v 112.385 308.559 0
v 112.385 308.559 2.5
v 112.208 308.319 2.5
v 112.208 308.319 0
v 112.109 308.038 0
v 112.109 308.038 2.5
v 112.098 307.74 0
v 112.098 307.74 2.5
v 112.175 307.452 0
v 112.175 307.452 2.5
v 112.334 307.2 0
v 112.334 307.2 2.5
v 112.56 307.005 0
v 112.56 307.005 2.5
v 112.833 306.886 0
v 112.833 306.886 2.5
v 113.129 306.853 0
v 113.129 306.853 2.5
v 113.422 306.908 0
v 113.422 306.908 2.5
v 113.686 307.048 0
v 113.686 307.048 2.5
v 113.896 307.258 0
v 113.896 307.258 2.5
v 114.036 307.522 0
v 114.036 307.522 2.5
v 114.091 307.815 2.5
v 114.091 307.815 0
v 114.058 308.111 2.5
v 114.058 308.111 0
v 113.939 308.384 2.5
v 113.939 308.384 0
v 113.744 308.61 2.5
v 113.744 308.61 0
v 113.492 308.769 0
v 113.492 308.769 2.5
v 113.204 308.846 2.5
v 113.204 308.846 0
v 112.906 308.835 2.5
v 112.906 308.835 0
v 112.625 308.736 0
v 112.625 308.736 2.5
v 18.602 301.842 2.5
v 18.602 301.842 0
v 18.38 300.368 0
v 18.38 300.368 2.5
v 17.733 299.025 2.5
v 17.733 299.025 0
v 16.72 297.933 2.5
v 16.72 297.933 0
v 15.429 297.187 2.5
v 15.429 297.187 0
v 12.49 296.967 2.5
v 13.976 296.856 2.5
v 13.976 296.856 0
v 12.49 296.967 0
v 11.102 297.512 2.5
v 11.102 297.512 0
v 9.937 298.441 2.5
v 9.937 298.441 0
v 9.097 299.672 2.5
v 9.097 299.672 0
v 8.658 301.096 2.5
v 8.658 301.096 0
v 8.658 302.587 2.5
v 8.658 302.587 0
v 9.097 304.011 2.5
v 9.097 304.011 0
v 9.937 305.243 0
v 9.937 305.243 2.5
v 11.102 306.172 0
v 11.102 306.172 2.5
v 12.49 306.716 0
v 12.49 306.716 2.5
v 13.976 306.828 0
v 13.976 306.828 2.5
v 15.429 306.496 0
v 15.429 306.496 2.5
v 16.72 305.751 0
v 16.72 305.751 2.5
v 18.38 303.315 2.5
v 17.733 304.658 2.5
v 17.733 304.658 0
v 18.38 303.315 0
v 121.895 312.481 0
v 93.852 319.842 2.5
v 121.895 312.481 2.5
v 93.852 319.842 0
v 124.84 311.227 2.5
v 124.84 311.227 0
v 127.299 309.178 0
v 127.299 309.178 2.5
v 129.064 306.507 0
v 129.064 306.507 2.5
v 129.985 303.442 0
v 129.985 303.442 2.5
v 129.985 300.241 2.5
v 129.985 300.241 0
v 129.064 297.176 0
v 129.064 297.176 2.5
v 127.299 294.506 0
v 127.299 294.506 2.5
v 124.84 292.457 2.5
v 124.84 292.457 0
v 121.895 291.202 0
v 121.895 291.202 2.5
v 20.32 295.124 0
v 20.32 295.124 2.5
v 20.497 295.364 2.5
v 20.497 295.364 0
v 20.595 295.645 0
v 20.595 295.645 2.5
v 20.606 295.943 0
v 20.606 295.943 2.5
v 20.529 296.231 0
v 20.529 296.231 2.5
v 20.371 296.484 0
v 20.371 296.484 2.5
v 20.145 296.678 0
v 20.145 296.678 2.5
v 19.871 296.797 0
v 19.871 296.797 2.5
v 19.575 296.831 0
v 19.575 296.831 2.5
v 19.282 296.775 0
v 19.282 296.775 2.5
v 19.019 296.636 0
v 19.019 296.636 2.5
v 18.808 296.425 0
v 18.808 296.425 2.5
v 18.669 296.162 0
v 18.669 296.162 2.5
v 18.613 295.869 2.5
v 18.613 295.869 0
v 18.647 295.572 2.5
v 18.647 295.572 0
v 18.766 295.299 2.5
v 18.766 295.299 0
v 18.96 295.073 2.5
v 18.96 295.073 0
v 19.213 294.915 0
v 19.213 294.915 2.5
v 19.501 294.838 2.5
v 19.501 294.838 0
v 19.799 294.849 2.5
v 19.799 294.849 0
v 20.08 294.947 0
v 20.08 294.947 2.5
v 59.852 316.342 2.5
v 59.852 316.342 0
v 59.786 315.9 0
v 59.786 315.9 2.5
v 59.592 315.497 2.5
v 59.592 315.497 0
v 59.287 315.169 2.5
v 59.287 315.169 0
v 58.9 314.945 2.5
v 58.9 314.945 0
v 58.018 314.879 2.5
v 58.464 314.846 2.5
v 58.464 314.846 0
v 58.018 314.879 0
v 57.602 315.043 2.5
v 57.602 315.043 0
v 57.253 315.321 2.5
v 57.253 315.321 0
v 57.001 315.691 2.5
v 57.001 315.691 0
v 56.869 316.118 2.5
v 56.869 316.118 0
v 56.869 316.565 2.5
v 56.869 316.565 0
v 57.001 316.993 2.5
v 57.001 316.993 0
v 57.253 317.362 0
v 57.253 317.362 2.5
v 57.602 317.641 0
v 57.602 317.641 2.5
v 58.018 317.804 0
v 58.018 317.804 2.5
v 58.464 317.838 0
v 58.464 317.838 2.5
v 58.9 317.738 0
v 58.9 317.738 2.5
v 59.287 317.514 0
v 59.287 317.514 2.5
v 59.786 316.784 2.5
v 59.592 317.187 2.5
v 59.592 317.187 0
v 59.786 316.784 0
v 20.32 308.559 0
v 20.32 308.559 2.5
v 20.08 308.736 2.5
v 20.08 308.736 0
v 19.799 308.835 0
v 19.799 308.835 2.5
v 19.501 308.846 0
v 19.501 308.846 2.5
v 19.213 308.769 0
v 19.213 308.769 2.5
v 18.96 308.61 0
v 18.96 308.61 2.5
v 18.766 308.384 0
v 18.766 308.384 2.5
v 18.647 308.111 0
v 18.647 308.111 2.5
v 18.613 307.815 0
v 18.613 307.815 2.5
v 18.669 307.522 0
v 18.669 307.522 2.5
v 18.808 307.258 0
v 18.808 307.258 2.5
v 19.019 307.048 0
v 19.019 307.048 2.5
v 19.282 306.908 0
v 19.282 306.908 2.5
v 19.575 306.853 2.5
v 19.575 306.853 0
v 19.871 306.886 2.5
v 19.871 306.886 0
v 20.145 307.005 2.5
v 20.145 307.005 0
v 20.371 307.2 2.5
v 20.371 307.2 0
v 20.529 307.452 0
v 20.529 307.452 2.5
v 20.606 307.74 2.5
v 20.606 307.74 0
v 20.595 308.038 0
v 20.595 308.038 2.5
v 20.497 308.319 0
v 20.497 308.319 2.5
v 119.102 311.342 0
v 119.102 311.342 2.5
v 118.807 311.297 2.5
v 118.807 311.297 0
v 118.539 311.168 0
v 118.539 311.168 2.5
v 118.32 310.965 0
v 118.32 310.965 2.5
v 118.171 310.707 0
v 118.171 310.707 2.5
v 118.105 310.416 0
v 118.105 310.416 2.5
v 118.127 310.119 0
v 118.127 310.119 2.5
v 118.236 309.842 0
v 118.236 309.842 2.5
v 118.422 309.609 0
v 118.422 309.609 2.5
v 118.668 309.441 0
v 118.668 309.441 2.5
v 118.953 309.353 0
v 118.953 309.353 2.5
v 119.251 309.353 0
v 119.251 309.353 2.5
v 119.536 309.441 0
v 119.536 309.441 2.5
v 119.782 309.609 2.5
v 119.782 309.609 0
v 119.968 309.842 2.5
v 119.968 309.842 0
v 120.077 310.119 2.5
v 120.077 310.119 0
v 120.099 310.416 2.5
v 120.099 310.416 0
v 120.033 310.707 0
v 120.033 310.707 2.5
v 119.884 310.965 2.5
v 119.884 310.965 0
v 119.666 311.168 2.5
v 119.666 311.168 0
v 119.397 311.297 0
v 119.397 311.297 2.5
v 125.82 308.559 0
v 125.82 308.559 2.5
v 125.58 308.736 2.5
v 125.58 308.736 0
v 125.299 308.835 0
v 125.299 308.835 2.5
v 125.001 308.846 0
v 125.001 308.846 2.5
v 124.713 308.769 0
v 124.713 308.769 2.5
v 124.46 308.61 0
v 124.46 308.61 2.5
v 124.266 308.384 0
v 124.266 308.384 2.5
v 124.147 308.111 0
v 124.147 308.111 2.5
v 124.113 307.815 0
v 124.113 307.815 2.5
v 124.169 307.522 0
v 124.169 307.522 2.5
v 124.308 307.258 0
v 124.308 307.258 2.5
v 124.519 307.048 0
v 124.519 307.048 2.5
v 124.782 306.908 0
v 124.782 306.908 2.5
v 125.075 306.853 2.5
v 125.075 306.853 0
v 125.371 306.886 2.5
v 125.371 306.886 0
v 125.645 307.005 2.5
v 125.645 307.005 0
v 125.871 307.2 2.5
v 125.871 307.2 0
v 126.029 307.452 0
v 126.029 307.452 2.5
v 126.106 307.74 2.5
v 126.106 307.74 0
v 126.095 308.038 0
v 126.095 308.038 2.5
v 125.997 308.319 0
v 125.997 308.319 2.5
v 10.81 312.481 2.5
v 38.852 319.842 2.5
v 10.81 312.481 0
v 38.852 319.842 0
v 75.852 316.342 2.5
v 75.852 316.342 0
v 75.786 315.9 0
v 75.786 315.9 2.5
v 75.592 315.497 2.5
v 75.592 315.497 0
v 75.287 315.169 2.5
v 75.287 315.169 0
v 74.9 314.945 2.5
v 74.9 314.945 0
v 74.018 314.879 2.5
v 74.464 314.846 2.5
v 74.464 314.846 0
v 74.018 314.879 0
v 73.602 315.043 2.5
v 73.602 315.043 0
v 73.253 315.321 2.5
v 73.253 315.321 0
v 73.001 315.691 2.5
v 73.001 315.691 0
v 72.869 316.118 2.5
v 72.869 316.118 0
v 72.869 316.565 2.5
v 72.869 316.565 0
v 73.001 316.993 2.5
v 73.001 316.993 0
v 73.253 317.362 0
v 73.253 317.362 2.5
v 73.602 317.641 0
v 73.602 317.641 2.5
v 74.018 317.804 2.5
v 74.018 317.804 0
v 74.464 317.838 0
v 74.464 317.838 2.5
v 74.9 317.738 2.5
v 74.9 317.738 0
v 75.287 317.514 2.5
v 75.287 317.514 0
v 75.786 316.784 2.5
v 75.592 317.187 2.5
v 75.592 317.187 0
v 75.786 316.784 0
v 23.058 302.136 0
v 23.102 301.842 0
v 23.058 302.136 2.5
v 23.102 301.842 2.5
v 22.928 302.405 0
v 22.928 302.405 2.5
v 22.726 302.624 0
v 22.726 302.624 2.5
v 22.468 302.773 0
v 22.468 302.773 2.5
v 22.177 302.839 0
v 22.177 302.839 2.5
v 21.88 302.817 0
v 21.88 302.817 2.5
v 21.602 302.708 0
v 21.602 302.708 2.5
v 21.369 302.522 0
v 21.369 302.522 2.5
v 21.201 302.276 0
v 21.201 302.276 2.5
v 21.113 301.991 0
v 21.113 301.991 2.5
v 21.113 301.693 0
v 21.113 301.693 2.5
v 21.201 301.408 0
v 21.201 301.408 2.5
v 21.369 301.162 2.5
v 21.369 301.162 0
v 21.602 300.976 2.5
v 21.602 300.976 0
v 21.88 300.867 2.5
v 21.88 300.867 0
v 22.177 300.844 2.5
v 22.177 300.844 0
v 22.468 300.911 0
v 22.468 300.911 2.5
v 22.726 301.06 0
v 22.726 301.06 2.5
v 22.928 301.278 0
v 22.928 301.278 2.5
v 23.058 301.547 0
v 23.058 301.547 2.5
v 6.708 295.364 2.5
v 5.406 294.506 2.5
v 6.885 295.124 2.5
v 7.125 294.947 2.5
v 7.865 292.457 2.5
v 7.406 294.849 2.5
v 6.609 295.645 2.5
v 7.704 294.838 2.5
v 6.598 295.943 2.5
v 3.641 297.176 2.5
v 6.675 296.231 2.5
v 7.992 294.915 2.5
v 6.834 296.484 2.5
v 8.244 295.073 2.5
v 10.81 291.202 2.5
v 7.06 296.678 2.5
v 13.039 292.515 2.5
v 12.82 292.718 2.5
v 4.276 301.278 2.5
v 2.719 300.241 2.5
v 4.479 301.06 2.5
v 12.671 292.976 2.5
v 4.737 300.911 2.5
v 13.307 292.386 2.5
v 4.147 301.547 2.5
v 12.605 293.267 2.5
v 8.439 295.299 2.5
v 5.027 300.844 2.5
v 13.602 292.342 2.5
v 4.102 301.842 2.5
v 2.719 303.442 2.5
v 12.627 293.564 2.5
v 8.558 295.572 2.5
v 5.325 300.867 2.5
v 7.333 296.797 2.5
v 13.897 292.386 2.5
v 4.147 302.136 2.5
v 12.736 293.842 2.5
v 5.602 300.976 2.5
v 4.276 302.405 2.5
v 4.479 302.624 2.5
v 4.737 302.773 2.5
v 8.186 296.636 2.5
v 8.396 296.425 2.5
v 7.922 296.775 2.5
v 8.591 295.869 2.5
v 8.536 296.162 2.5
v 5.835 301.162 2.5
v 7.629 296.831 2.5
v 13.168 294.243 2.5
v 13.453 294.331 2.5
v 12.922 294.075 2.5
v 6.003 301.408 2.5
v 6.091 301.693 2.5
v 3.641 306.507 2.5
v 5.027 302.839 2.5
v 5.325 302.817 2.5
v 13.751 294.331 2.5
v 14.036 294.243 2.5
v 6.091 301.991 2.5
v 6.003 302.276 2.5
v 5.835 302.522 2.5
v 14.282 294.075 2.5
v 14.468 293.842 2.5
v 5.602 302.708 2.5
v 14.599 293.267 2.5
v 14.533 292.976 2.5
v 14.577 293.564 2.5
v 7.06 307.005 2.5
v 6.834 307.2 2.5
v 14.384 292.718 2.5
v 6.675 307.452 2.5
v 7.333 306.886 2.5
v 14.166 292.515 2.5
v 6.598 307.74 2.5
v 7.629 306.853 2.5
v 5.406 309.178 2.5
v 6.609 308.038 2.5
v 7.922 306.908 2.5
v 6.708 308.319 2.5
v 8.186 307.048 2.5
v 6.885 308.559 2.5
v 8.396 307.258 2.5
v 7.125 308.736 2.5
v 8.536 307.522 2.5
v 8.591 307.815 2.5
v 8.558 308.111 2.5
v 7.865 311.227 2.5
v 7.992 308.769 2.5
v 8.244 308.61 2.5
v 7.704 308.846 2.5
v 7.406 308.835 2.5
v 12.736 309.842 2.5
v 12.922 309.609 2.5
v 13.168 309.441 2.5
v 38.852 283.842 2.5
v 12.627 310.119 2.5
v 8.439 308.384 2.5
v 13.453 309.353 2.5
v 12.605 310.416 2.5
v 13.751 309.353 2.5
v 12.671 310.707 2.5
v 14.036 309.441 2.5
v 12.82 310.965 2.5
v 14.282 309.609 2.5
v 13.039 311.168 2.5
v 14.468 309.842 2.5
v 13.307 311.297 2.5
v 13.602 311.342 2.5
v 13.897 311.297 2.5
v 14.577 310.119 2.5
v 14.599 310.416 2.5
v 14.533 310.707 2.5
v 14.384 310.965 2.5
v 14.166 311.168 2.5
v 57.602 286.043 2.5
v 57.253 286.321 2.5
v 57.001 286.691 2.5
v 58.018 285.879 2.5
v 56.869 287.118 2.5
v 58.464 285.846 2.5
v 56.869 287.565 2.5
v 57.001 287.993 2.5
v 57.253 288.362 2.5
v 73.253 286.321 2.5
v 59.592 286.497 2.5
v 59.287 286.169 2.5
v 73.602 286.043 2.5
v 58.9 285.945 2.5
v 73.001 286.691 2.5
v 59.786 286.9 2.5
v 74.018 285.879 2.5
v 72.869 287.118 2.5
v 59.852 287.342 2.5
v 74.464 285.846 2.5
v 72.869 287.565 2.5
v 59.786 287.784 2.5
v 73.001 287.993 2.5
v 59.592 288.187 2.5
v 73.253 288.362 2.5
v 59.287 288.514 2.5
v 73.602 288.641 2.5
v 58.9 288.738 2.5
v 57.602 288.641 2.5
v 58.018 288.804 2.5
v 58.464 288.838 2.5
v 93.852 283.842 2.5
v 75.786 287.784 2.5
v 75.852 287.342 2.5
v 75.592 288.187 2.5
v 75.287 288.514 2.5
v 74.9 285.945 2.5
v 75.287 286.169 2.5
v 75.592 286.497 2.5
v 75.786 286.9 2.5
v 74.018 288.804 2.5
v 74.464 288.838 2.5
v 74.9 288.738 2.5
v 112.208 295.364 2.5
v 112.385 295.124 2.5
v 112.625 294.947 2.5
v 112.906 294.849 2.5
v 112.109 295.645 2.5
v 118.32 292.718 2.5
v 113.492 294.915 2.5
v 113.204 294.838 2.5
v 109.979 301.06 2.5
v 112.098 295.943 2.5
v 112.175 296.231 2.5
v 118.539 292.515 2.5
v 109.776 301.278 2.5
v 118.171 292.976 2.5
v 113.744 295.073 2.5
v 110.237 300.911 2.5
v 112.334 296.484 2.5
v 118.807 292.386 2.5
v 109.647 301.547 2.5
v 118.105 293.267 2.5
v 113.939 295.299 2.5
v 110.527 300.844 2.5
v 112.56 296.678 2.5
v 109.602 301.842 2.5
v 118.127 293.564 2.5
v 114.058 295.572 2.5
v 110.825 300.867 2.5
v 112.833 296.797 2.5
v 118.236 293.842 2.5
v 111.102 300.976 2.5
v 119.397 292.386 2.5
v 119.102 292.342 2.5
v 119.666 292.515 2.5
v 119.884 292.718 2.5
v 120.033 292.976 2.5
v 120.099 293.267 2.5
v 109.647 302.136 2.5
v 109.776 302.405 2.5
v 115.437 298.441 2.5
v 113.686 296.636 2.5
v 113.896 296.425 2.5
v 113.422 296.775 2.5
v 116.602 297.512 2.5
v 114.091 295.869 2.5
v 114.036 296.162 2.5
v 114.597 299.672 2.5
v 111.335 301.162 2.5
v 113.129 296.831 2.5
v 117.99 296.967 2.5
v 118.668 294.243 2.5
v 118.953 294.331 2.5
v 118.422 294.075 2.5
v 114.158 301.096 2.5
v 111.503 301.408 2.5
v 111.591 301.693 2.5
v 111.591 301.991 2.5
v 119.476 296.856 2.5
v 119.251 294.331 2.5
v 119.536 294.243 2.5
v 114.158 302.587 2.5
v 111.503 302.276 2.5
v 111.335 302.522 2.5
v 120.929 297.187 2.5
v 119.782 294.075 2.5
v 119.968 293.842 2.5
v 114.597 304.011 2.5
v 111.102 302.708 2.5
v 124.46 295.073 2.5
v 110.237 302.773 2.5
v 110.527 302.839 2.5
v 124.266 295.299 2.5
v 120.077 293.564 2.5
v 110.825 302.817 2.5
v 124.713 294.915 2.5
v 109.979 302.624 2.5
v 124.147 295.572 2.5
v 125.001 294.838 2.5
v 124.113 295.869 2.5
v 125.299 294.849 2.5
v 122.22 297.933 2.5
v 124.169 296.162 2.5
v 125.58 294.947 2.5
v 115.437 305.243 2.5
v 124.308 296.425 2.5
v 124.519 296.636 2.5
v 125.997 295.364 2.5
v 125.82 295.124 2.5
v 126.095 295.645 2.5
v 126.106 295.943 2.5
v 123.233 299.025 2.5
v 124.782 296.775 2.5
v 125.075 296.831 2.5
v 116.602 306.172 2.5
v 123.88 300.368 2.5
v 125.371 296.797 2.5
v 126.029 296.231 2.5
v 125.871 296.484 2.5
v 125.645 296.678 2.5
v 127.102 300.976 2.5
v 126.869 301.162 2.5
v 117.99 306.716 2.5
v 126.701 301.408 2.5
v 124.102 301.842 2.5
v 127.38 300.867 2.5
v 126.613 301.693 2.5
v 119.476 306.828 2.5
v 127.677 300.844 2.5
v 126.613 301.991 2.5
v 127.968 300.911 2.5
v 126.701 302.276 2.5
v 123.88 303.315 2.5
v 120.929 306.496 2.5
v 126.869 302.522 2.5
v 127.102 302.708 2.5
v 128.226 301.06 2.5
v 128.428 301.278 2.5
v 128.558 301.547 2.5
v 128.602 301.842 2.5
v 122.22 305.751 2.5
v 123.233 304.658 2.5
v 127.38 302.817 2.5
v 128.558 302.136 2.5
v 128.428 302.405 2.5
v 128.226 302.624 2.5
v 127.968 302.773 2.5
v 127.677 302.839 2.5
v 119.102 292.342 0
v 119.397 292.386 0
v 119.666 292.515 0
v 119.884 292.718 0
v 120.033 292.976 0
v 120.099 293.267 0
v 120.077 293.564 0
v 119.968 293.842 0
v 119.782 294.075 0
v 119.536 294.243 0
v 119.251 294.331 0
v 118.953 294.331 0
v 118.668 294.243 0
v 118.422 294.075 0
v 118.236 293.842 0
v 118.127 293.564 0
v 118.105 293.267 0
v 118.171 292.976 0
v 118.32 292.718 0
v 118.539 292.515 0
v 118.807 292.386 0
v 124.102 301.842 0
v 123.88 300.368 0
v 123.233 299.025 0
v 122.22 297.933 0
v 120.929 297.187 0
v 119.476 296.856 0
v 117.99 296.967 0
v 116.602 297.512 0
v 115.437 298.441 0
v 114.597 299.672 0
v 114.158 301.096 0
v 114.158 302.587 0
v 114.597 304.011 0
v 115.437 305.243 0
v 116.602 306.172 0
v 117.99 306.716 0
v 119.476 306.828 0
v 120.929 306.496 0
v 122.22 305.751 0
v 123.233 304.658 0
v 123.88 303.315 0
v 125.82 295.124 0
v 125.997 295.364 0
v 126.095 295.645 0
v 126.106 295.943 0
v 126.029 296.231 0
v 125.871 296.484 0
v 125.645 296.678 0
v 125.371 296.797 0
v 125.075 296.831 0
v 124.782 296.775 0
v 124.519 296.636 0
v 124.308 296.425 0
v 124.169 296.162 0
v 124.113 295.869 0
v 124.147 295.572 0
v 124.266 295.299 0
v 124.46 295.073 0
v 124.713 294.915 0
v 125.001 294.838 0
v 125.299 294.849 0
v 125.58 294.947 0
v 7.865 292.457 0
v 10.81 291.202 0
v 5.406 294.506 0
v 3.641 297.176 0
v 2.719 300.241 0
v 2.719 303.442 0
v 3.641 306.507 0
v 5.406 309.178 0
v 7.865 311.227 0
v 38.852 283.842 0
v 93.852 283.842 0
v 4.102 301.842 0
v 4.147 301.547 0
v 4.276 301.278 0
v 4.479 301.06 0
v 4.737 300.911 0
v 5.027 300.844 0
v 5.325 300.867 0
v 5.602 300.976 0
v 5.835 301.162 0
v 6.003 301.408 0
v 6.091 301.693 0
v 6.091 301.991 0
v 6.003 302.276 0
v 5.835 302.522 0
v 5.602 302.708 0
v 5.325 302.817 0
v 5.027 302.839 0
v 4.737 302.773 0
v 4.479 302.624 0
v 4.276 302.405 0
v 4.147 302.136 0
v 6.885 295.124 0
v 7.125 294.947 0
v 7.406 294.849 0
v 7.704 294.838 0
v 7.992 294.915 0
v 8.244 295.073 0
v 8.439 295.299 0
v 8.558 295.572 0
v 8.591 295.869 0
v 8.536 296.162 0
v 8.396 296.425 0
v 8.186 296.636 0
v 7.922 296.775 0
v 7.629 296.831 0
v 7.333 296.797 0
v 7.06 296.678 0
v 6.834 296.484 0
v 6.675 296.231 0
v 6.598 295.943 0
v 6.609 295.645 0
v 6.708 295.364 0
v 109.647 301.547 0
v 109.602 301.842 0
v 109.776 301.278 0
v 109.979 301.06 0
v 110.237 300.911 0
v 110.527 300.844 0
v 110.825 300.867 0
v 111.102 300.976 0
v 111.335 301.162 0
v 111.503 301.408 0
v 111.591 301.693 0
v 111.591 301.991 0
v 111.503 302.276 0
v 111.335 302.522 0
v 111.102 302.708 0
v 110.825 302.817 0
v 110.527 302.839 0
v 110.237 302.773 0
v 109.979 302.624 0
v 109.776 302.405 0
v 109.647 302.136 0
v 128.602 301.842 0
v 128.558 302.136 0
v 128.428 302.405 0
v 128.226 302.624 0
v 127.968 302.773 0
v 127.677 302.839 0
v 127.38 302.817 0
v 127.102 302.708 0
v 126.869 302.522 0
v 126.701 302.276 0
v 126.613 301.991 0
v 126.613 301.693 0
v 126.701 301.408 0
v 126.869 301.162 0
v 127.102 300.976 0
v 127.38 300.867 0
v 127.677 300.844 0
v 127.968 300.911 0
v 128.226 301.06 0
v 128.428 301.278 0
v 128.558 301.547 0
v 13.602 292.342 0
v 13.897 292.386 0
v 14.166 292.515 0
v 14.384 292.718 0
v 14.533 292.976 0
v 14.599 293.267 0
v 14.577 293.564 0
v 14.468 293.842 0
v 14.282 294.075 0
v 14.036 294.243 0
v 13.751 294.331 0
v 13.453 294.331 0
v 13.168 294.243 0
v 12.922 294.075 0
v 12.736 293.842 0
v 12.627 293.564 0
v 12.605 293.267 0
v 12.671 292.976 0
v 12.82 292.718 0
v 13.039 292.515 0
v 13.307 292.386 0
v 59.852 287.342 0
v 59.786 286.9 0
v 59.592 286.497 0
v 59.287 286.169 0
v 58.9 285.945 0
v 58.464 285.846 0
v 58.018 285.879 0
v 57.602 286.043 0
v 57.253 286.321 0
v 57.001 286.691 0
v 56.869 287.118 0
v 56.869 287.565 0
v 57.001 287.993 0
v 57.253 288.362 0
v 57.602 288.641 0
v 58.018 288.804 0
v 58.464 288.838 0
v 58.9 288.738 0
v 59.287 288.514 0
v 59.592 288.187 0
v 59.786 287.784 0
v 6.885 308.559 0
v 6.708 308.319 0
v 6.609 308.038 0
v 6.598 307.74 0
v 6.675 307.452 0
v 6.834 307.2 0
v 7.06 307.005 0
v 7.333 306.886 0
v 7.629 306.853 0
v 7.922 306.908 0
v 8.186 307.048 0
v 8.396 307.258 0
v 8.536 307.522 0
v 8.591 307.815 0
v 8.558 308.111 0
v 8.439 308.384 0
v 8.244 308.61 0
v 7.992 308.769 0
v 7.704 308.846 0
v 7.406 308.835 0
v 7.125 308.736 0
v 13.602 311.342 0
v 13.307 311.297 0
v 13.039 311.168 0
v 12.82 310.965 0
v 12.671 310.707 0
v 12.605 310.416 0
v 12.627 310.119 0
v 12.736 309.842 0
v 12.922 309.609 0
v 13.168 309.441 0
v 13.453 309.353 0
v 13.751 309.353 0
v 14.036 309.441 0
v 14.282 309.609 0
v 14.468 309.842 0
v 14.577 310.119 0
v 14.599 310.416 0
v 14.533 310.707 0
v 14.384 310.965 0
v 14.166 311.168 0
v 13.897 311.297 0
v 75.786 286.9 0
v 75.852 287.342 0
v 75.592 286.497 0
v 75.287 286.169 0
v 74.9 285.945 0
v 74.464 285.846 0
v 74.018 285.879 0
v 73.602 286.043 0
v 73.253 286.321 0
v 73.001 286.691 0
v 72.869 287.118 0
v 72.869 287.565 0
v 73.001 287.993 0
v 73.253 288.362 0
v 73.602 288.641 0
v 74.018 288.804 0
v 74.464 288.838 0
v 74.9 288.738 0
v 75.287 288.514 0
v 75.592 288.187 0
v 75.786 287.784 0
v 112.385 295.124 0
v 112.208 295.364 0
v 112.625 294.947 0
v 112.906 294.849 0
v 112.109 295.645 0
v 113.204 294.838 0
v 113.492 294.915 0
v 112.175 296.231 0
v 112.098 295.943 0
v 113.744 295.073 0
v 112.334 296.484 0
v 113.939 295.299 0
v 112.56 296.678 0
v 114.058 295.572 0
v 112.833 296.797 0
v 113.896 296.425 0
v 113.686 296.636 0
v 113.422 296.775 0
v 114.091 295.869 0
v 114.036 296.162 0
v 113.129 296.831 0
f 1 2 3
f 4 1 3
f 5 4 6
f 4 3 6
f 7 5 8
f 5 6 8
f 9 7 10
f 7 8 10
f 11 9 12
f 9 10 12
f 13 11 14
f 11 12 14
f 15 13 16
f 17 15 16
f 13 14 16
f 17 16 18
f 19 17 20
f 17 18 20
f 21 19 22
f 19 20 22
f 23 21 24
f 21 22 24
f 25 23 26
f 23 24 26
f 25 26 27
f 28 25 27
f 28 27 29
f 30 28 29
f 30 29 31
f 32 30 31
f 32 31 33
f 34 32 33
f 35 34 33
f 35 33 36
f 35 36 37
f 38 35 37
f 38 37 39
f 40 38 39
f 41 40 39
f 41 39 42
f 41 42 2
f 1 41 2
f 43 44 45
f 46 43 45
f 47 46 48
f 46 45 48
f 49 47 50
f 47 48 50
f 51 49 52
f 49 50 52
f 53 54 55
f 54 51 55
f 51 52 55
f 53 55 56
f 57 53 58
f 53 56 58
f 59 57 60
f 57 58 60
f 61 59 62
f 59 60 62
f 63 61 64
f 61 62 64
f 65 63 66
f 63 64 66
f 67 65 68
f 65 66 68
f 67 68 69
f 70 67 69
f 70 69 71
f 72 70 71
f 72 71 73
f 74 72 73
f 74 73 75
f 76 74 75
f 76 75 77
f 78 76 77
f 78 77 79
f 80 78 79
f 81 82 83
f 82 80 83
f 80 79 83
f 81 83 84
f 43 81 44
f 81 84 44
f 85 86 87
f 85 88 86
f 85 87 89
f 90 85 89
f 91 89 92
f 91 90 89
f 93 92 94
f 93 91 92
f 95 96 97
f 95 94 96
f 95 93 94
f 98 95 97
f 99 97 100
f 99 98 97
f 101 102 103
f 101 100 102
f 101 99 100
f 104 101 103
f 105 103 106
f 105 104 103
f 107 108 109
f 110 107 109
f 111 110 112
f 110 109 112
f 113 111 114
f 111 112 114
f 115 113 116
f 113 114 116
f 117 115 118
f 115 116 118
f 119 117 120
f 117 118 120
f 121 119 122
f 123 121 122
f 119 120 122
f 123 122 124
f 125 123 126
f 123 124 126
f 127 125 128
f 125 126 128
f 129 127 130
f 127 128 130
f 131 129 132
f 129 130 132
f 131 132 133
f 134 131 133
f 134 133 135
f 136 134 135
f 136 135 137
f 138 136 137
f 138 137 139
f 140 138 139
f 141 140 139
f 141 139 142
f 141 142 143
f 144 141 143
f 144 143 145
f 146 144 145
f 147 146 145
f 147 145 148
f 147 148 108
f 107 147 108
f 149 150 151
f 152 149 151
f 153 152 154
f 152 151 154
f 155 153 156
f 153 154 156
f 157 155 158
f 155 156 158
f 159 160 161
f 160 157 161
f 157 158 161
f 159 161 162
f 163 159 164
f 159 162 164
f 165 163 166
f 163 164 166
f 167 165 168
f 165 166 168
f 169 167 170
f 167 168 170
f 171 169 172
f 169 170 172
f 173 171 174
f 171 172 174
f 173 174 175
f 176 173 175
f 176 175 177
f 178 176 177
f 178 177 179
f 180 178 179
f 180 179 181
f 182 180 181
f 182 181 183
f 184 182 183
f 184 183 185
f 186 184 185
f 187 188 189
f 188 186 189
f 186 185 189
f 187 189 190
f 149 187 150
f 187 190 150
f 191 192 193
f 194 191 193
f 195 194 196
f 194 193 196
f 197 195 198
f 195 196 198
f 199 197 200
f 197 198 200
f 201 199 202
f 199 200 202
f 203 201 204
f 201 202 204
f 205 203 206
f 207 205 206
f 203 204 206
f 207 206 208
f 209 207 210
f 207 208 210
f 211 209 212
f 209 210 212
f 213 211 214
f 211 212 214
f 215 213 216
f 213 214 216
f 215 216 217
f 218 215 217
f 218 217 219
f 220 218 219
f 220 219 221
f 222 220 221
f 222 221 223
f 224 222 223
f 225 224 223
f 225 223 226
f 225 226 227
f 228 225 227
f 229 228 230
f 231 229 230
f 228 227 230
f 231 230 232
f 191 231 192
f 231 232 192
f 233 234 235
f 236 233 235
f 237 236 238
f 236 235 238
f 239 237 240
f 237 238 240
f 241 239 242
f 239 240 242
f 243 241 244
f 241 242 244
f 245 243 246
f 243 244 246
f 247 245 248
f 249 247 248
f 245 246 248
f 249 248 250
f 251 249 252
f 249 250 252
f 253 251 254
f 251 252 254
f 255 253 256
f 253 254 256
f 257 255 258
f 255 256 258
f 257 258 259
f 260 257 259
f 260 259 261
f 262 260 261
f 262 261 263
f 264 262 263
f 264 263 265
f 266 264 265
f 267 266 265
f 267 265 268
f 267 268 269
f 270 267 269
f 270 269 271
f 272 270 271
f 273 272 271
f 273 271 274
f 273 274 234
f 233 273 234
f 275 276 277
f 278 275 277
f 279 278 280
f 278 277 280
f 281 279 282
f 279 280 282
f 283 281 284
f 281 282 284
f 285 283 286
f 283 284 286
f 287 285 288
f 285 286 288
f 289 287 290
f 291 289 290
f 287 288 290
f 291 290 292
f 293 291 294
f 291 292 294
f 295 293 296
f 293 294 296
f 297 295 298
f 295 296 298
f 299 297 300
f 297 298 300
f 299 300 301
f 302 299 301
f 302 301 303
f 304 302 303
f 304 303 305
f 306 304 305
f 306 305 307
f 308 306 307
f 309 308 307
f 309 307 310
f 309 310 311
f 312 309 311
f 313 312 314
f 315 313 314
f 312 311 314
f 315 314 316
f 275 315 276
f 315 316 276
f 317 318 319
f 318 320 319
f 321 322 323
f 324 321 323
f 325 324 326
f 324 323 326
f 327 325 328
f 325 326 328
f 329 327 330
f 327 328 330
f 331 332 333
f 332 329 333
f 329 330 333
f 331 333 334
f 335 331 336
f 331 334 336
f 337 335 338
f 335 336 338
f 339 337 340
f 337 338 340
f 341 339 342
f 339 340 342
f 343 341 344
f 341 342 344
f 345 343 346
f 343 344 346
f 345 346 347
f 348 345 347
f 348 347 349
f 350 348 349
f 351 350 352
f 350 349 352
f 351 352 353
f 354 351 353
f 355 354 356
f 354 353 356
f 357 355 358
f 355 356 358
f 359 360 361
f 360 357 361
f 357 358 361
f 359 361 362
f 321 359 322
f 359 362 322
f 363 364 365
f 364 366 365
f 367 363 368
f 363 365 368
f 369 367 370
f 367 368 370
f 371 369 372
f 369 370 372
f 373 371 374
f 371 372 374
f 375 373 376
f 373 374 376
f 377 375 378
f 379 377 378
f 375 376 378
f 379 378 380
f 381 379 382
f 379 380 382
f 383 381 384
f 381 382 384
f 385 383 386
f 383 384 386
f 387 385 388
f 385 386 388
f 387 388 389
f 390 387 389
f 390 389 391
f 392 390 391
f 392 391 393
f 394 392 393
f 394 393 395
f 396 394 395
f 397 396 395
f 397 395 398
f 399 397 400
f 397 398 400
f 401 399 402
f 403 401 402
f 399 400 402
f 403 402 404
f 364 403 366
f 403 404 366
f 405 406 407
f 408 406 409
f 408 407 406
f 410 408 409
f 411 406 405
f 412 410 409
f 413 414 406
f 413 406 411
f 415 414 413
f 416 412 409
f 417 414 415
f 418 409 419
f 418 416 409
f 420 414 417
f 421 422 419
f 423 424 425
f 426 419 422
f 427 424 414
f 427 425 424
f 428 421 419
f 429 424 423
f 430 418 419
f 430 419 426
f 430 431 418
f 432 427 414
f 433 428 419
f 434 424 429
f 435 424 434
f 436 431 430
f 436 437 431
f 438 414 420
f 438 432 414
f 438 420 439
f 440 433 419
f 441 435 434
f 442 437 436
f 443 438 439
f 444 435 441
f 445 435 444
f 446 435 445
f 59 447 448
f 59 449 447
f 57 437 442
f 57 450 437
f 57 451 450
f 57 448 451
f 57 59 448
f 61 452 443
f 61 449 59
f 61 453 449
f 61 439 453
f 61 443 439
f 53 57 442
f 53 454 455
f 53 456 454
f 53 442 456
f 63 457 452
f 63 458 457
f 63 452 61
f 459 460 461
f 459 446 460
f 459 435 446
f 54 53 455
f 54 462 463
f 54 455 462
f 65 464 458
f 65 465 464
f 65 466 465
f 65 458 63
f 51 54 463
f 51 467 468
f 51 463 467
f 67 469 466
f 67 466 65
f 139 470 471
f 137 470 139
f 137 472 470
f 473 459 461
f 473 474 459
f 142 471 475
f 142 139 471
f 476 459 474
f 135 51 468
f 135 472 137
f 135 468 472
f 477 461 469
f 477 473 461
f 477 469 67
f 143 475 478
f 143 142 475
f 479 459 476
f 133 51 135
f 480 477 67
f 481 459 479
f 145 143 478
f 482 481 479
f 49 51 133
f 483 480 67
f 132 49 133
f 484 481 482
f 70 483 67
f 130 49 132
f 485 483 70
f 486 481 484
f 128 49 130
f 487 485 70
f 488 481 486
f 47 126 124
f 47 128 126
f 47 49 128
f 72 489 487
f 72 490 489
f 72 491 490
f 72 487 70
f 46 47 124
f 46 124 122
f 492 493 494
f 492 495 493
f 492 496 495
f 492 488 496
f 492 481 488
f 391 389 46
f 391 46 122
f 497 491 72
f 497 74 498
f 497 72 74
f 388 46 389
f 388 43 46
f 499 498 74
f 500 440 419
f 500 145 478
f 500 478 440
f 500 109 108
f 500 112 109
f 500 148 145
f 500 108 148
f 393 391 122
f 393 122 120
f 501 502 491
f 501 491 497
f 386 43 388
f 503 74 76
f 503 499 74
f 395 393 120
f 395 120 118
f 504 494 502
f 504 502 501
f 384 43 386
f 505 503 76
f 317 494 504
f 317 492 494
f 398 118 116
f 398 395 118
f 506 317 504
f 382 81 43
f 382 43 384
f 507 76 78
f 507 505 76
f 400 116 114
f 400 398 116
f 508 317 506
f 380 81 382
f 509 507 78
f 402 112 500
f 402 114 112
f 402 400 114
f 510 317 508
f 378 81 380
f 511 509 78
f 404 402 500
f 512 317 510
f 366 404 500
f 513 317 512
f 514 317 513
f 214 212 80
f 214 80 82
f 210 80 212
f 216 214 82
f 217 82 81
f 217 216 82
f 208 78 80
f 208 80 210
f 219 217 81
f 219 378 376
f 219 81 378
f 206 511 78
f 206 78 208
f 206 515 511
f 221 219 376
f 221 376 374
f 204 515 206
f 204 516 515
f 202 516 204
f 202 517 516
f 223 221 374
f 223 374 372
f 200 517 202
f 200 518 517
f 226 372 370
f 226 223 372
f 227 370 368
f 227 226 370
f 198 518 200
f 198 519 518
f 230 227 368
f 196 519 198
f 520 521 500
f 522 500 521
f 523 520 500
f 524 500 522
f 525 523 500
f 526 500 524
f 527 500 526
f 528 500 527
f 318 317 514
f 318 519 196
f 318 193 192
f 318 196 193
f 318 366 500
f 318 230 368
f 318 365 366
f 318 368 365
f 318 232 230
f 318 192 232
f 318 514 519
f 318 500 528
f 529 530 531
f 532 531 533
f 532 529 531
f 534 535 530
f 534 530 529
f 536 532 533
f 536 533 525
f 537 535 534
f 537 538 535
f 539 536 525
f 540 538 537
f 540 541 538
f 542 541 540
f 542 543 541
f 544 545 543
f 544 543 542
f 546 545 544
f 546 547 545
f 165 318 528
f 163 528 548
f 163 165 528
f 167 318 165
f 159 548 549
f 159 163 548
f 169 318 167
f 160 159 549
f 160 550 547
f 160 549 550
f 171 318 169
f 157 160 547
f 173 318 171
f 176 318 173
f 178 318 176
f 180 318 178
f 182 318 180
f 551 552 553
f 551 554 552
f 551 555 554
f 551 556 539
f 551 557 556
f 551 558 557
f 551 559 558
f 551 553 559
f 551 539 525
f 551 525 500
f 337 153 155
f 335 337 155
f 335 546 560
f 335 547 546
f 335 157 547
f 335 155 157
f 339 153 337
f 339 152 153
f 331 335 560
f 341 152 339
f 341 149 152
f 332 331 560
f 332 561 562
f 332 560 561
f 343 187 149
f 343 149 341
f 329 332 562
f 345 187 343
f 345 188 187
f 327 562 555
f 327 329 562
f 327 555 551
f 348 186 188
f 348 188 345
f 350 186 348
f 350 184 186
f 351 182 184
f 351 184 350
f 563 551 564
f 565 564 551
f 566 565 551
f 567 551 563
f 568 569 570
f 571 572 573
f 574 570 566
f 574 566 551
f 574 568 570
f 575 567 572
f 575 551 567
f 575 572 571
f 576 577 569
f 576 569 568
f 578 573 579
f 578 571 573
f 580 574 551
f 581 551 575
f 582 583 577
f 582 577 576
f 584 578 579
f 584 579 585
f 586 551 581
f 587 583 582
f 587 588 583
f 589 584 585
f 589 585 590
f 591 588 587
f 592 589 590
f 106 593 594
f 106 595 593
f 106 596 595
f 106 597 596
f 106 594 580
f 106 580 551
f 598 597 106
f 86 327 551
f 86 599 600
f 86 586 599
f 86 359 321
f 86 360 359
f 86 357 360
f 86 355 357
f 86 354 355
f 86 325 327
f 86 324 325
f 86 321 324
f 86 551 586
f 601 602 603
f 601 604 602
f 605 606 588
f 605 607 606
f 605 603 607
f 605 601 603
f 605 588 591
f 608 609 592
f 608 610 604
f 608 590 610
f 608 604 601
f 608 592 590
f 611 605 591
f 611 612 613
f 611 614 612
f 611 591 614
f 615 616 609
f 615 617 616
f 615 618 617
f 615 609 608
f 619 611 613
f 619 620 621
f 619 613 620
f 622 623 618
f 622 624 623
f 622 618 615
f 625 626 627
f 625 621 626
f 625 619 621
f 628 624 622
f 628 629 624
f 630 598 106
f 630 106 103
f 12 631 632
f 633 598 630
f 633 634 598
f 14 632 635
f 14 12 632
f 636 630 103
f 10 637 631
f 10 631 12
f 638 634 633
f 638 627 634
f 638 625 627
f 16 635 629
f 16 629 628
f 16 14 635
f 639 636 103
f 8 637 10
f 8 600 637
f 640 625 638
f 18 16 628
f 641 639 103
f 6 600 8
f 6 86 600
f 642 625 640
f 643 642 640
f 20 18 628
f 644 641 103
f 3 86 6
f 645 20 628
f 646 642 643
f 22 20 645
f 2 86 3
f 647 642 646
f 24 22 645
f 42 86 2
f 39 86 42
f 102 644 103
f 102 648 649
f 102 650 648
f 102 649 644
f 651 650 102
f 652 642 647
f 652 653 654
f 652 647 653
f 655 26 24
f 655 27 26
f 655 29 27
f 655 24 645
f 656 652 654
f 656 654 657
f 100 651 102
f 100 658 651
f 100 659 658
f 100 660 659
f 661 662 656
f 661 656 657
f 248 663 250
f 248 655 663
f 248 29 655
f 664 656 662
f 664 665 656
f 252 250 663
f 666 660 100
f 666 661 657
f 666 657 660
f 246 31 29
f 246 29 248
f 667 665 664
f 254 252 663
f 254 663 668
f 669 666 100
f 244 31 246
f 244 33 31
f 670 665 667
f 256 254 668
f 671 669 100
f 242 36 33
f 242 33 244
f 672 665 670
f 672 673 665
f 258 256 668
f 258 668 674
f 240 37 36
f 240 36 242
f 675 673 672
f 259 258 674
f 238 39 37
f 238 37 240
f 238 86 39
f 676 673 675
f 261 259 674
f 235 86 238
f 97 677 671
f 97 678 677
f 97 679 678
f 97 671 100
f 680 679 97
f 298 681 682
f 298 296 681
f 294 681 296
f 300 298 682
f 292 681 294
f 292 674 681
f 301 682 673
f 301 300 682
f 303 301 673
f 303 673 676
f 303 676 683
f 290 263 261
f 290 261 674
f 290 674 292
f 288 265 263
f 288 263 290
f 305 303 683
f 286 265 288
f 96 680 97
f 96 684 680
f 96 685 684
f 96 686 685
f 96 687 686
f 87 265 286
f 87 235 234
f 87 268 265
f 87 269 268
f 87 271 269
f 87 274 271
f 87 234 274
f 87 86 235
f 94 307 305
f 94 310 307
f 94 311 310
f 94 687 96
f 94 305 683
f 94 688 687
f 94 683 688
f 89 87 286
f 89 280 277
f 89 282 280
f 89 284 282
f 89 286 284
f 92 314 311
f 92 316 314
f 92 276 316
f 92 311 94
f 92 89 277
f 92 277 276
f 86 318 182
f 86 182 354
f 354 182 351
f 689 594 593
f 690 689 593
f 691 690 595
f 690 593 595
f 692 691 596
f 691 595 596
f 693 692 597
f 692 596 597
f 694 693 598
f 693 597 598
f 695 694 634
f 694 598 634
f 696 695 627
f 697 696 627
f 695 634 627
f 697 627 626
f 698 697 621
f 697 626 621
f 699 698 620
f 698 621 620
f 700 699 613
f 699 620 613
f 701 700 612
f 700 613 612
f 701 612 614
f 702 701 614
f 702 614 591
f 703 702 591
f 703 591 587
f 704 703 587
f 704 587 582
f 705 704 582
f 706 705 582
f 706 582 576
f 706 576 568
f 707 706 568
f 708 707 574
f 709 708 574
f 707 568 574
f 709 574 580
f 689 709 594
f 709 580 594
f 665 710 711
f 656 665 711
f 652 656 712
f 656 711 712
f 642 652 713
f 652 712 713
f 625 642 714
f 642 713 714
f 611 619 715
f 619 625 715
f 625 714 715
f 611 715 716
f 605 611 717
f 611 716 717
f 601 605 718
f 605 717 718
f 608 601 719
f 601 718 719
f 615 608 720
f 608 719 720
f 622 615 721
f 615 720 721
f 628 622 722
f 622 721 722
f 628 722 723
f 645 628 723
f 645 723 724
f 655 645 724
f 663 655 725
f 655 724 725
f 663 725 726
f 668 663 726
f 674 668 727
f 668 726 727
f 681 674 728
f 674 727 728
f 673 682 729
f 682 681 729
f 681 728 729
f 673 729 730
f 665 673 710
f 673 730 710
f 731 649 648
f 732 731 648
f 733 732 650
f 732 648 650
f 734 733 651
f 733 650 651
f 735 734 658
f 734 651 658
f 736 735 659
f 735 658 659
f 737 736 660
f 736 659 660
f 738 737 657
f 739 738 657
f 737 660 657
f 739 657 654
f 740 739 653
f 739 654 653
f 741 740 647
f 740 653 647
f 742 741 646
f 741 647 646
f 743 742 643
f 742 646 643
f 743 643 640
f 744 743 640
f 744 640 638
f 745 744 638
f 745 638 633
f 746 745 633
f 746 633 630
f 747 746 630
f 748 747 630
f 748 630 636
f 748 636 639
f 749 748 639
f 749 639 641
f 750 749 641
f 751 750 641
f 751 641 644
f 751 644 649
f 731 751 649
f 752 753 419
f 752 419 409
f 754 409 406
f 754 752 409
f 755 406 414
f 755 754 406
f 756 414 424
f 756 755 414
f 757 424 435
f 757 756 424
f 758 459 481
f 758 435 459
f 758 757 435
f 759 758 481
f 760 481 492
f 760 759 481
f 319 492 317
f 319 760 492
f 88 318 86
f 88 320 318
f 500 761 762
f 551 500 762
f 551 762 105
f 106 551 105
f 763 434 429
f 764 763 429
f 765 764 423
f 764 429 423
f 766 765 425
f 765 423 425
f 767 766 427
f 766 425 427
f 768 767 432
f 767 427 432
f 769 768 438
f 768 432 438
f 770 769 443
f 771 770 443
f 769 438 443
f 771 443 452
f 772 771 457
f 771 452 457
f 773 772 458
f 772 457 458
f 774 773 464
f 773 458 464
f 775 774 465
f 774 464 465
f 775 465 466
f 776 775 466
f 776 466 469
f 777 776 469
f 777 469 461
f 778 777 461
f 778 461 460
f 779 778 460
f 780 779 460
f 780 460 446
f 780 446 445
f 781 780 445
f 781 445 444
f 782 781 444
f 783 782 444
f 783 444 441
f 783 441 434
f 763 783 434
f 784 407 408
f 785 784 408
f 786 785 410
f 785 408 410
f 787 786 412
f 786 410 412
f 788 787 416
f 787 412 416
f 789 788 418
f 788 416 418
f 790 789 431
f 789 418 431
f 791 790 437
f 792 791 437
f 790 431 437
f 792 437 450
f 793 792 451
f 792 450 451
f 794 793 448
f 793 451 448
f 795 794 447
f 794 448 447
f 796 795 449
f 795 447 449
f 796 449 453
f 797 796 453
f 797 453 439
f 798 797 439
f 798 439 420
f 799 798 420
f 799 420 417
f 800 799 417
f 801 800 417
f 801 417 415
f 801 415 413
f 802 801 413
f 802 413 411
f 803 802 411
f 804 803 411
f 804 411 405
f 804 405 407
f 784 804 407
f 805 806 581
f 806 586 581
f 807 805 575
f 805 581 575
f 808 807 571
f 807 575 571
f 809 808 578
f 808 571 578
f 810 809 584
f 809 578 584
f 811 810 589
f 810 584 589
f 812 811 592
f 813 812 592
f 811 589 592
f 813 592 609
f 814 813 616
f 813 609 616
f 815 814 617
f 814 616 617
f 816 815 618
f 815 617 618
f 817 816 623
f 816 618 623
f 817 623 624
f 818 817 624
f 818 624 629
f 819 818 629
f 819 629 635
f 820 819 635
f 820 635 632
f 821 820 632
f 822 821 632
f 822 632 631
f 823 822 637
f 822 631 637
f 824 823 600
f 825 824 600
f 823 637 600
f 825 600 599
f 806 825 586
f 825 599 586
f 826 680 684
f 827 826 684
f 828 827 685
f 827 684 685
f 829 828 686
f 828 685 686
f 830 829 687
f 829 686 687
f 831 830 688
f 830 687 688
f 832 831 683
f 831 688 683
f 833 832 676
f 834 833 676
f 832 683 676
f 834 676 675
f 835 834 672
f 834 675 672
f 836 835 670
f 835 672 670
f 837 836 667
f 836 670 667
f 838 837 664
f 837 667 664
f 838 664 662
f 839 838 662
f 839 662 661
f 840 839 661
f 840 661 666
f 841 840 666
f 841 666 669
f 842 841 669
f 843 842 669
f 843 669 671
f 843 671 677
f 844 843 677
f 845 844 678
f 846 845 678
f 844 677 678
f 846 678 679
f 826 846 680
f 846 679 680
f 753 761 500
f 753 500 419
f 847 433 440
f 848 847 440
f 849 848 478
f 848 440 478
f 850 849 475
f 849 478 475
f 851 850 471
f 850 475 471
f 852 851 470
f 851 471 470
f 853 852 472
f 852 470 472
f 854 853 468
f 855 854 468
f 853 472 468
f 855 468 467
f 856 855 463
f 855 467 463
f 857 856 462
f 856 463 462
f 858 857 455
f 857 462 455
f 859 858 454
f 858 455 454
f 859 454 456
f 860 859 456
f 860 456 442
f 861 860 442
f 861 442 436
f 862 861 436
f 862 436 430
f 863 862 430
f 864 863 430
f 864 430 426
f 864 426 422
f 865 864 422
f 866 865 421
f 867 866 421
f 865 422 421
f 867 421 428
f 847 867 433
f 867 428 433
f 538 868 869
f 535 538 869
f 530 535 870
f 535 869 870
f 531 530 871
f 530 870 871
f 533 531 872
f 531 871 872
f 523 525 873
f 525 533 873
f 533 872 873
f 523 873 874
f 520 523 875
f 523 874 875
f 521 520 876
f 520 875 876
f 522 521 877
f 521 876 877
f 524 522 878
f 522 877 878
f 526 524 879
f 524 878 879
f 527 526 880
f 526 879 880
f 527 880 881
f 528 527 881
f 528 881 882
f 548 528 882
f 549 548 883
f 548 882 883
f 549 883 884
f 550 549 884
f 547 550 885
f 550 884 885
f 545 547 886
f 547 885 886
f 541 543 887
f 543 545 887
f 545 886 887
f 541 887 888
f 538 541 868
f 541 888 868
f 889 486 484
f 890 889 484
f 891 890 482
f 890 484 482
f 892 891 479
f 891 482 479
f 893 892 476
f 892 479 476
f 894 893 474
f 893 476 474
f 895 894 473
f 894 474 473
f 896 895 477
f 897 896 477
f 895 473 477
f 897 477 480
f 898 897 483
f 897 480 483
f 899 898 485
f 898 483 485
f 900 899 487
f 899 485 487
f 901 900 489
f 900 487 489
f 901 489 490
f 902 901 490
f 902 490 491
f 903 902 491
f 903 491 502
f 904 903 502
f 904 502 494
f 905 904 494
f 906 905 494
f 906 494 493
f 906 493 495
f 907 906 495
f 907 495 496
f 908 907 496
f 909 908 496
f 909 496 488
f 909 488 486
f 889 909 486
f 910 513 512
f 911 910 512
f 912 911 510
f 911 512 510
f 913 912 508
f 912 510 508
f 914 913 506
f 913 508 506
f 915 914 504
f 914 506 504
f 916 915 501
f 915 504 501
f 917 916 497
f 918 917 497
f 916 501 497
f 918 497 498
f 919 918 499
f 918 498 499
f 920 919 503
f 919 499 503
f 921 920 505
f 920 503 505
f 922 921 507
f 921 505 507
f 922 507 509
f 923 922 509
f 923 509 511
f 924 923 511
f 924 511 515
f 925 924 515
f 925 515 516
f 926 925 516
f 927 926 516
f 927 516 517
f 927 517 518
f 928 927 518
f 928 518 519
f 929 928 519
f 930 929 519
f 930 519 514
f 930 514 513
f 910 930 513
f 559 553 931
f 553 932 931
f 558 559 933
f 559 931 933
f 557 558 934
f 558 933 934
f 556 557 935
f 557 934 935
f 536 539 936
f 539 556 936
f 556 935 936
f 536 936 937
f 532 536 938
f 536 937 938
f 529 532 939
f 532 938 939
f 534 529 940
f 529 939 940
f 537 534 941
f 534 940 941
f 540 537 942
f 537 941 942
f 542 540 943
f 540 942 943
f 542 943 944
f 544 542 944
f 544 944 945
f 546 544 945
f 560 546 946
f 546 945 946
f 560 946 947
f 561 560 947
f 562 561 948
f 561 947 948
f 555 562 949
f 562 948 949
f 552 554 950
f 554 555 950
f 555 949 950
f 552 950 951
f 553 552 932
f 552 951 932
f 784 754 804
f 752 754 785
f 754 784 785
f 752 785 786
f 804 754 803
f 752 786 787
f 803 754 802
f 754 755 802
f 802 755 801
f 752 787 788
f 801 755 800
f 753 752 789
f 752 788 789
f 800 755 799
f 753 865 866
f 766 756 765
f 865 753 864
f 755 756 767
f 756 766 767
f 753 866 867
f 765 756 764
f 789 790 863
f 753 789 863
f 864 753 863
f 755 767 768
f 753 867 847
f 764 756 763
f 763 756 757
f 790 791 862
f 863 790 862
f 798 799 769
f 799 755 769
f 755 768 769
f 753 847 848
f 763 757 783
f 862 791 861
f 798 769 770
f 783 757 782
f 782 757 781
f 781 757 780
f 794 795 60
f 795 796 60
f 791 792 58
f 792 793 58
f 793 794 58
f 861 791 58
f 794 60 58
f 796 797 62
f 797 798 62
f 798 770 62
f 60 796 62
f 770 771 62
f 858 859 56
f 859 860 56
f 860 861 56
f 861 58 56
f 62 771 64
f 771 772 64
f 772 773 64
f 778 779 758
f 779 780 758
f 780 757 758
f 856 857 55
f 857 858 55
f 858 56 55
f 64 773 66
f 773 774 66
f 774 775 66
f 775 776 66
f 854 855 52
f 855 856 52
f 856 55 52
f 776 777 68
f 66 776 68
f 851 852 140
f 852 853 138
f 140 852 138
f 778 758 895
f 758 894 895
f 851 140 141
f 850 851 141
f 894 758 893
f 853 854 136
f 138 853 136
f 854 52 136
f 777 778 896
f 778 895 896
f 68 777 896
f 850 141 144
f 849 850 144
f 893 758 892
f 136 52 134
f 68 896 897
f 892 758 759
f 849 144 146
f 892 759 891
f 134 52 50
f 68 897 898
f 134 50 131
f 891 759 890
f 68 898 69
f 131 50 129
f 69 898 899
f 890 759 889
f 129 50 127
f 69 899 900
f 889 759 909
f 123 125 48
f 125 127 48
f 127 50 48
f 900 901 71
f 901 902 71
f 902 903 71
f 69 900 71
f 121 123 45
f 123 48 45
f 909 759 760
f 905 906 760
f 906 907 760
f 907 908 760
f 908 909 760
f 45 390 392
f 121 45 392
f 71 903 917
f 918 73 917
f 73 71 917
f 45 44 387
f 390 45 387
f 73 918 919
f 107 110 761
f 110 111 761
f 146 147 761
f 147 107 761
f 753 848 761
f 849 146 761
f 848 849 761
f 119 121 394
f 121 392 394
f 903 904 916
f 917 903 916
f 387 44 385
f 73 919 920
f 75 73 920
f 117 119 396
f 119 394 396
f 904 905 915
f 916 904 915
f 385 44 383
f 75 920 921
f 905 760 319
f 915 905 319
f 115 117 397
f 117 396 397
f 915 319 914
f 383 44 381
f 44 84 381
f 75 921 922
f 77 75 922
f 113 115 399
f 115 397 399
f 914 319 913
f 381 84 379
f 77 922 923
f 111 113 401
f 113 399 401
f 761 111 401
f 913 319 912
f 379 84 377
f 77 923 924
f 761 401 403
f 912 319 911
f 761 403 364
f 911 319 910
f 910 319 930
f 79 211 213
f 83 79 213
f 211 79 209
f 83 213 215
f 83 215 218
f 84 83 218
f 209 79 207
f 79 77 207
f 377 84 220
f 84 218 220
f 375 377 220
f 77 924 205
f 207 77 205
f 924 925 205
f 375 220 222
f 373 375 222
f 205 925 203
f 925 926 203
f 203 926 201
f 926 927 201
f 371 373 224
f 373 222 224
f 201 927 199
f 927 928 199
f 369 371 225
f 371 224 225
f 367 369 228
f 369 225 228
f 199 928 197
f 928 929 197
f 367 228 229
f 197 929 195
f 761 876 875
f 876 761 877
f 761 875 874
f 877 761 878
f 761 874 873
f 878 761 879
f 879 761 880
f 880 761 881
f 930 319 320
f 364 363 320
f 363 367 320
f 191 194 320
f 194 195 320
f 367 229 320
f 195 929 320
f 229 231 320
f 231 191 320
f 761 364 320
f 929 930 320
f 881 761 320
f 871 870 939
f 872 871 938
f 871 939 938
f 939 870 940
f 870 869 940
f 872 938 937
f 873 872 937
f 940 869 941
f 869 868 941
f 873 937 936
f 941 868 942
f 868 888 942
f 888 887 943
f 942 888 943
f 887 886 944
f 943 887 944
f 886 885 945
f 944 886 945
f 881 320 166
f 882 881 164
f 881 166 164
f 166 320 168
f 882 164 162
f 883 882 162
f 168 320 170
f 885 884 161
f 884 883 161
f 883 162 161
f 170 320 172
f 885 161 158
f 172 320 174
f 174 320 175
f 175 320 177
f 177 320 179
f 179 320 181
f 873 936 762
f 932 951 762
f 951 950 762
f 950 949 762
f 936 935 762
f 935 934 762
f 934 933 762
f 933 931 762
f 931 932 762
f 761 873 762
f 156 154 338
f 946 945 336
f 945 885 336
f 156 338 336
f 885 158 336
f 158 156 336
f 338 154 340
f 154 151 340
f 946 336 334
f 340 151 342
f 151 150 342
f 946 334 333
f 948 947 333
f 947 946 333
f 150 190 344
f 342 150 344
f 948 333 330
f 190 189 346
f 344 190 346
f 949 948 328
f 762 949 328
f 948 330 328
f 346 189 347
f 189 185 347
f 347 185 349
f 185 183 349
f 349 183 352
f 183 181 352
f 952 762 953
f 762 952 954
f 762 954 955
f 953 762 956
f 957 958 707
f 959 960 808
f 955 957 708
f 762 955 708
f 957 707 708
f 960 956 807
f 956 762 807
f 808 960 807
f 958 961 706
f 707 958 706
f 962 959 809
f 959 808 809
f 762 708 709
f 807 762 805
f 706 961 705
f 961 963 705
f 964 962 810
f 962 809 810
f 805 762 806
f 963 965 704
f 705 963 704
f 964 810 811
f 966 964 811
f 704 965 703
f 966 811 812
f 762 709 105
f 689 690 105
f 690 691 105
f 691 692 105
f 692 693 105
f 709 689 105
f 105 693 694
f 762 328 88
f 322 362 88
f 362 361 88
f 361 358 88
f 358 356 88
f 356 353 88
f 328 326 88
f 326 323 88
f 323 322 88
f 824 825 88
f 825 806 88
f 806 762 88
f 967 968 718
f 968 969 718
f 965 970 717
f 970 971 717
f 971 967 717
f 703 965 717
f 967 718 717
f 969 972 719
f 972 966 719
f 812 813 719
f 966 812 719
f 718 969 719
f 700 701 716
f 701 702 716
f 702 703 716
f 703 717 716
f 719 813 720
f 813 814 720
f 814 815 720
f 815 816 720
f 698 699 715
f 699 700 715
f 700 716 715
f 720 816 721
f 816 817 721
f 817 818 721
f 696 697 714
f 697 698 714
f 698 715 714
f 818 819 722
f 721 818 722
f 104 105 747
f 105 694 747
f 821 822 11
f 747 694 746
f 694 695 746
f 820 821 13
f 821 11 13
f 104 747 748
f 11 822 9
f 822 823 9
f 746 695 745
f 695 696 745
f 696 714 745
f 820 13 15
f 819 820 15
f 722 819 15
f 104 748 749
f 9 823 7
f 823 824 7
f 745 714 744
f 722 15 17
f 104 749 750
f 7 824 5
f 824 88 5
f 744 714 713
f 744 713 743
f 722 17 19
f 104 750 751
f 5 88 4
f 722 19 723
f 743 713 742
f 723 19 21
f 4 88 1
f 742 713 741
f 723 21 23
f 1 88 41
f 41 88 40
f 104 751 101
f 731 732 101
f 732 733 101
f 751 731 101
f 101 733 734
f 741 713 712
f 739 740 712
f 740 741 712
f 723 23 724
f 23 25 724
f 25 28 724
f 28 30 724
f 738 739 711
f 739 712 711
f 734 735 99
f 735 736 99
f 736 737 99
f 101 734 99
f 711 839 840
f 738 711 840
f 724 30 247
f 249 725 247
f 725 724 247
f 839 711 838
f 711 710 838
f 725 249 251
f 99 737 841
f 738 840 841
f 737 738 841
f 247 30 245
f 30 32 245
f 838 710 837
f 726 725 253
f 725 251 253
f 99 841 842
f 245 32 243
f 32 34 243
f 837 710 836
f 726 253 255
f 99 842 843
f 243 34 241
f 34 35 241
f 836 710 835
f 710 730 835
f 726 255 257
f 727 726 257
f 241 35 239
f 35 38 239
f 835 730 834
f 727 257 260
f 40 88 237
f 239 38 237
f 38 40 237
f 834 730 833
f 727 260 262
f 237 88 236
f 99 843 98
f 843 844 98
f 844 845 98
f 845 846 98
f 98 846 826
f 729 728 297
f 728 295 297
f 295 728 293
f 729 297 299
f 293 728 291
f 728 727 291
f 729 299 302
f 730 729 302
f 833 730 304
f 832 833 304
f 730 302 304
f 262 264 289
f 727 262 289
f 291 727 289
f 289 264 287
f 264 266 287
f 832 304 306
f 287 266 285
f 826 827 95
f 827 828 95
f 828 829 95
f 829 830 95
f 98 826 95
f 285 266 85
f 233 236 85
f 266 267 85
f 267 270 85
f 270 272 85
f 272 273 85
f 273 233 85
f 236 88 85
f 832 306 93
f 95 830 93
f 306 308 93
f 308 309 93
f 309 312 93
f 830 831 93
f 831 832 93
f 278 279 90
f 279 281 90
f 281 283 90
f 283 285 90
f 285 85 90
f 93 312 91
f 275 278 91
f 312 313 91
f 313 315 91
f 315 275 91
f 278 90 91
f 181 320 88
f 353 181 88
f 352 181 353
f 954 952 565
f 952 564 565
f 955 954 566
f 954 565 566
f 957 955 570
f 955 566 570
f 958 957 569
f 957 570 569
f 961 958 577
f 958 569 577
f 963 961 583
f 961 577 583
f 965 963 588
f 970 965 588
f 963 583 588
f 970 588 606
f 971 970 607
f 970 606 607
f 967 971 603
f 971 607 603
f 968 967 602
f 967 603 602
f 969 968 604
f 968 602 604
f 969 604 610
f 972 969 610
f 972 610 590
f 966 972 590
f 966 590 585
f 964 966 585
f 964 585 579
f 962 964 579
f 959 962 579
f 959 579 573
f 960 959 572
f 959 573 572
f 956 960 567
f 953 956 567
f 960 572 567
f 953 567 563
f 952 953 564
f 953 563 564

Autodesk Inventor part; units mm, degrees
ref_plane "YZ Plane" through (0, 0, 0) normal (1, 0, 0) x (0, 1, 0)
ref_plane "XZ Plane" through (0, 0, 0) normal (0, 1, 0) x (-1, 0, 0)
ref_plane "XY Plane" through (0, 0, 0) normal (0, 0, 1) x (1, 0, 0)
sketch "Sketch1" plane through (0, 0, 0) normal (0, 0, 1) x (1, 0, 0)
  line L0 (38.8522, 283.8417) -> (93.8522, 283.8417)
  line L1 (38.8522, 319.8417) -> (93.8522, 319.8417)
  arc A0 (10.8096, 312.4813) -> (10.8096, 291.2021) centre (13.6022, 301.8417) ccw
  line L2 (38.8522, 319.8417) -> (10.8096, 312.4813)
  line L3 (38.8522, 283.8417) -> (10.8096, 291.2021)
  arc A1 (121.8948, 291.2021) -> (121.8948, 312.4813) centre (119.1022, 301.8417) ccw
  line L4 (93.8522, 319.8417) -> (121.8948, 312.4813)
  line L5 (93.8522, 283.8417) -> (121.8948, 291.2021)
  circle A2 centre (13.6022, 301.8417) radius 5
  circle A3 centre (119.1022, 301.8417) radius 5
  circle A4 centre (58.3522, 316.3417) radius 1.5
  circle A5 centre (74.3522, 316.3417) radius 1.5
  circle A6 centre (58.3522, 287.3417) radius 1.5
  circle A7 centre (74.3522, 287.3417) radius 1.5
  dimension "d5" = 36
  dimension "d6" = 105.5
  dimension "d7" = 105.5
  dimension "d8" = 25.25
  dimension "d9" = 25.25
  dimension "d10" = 25.25
  dimension "d11" = 16
  dimension "d12" = 16
  dimension "d13" = 19.5
  dimension "d14" = 19.5
extrude "Extrusion1" add sketch "Sketch1" along normal blind 2.5
sketch "Sketch2" plane through (0, 0, 2.5) normal (0, 0, 1) x (1, 0, 0)
  circle A0 centre (13.6022, 301.8417) radius 5 projected
  circle A1 centre (22.1022, 301.8417) radius 1
  point P0 (0, 0)
  dimension "d15" = 2
  dimension "d16" = 8.5
extrude "Extrusion2" cut sketch "Sketch2" against normal through all contours A1
pattern_circular "Circular Pattern1" count 8 over 360 about axis through (13.6022, 301.8417, 0) along (0, 0, 1) of "Extrusion2"
sketch "Sketch3" plane through (0, 0, 2.5) normal (0, 0, 1) x (1, 0, 0)
  circle A0 centre (5.1022, 301.8417) radius 1 projected
  line L0 (93.8522, 319.8417) -> (38.8522, 319.8417) projected
  line L1 (66.3522, 319.8417) -> (66.3522, 283.8417)
  line L2 (38.8522, 283.8417) -> (93.8522, 283.8417) projected
  circle A1 centre (127.6022, 301.8417) radius 1
  point P0 (0, 0)
extrude "Extrusion3" cut sketch "Sketch3" against normal through all contours A1
pattern_circular "Circular Pattern2" count 8 over 360 about axis through (119.1022, 301.8417, 0) along (0, 0, 1) of "Extrusion3"
properties part number "Thigh" material "Aluminum-6061"
